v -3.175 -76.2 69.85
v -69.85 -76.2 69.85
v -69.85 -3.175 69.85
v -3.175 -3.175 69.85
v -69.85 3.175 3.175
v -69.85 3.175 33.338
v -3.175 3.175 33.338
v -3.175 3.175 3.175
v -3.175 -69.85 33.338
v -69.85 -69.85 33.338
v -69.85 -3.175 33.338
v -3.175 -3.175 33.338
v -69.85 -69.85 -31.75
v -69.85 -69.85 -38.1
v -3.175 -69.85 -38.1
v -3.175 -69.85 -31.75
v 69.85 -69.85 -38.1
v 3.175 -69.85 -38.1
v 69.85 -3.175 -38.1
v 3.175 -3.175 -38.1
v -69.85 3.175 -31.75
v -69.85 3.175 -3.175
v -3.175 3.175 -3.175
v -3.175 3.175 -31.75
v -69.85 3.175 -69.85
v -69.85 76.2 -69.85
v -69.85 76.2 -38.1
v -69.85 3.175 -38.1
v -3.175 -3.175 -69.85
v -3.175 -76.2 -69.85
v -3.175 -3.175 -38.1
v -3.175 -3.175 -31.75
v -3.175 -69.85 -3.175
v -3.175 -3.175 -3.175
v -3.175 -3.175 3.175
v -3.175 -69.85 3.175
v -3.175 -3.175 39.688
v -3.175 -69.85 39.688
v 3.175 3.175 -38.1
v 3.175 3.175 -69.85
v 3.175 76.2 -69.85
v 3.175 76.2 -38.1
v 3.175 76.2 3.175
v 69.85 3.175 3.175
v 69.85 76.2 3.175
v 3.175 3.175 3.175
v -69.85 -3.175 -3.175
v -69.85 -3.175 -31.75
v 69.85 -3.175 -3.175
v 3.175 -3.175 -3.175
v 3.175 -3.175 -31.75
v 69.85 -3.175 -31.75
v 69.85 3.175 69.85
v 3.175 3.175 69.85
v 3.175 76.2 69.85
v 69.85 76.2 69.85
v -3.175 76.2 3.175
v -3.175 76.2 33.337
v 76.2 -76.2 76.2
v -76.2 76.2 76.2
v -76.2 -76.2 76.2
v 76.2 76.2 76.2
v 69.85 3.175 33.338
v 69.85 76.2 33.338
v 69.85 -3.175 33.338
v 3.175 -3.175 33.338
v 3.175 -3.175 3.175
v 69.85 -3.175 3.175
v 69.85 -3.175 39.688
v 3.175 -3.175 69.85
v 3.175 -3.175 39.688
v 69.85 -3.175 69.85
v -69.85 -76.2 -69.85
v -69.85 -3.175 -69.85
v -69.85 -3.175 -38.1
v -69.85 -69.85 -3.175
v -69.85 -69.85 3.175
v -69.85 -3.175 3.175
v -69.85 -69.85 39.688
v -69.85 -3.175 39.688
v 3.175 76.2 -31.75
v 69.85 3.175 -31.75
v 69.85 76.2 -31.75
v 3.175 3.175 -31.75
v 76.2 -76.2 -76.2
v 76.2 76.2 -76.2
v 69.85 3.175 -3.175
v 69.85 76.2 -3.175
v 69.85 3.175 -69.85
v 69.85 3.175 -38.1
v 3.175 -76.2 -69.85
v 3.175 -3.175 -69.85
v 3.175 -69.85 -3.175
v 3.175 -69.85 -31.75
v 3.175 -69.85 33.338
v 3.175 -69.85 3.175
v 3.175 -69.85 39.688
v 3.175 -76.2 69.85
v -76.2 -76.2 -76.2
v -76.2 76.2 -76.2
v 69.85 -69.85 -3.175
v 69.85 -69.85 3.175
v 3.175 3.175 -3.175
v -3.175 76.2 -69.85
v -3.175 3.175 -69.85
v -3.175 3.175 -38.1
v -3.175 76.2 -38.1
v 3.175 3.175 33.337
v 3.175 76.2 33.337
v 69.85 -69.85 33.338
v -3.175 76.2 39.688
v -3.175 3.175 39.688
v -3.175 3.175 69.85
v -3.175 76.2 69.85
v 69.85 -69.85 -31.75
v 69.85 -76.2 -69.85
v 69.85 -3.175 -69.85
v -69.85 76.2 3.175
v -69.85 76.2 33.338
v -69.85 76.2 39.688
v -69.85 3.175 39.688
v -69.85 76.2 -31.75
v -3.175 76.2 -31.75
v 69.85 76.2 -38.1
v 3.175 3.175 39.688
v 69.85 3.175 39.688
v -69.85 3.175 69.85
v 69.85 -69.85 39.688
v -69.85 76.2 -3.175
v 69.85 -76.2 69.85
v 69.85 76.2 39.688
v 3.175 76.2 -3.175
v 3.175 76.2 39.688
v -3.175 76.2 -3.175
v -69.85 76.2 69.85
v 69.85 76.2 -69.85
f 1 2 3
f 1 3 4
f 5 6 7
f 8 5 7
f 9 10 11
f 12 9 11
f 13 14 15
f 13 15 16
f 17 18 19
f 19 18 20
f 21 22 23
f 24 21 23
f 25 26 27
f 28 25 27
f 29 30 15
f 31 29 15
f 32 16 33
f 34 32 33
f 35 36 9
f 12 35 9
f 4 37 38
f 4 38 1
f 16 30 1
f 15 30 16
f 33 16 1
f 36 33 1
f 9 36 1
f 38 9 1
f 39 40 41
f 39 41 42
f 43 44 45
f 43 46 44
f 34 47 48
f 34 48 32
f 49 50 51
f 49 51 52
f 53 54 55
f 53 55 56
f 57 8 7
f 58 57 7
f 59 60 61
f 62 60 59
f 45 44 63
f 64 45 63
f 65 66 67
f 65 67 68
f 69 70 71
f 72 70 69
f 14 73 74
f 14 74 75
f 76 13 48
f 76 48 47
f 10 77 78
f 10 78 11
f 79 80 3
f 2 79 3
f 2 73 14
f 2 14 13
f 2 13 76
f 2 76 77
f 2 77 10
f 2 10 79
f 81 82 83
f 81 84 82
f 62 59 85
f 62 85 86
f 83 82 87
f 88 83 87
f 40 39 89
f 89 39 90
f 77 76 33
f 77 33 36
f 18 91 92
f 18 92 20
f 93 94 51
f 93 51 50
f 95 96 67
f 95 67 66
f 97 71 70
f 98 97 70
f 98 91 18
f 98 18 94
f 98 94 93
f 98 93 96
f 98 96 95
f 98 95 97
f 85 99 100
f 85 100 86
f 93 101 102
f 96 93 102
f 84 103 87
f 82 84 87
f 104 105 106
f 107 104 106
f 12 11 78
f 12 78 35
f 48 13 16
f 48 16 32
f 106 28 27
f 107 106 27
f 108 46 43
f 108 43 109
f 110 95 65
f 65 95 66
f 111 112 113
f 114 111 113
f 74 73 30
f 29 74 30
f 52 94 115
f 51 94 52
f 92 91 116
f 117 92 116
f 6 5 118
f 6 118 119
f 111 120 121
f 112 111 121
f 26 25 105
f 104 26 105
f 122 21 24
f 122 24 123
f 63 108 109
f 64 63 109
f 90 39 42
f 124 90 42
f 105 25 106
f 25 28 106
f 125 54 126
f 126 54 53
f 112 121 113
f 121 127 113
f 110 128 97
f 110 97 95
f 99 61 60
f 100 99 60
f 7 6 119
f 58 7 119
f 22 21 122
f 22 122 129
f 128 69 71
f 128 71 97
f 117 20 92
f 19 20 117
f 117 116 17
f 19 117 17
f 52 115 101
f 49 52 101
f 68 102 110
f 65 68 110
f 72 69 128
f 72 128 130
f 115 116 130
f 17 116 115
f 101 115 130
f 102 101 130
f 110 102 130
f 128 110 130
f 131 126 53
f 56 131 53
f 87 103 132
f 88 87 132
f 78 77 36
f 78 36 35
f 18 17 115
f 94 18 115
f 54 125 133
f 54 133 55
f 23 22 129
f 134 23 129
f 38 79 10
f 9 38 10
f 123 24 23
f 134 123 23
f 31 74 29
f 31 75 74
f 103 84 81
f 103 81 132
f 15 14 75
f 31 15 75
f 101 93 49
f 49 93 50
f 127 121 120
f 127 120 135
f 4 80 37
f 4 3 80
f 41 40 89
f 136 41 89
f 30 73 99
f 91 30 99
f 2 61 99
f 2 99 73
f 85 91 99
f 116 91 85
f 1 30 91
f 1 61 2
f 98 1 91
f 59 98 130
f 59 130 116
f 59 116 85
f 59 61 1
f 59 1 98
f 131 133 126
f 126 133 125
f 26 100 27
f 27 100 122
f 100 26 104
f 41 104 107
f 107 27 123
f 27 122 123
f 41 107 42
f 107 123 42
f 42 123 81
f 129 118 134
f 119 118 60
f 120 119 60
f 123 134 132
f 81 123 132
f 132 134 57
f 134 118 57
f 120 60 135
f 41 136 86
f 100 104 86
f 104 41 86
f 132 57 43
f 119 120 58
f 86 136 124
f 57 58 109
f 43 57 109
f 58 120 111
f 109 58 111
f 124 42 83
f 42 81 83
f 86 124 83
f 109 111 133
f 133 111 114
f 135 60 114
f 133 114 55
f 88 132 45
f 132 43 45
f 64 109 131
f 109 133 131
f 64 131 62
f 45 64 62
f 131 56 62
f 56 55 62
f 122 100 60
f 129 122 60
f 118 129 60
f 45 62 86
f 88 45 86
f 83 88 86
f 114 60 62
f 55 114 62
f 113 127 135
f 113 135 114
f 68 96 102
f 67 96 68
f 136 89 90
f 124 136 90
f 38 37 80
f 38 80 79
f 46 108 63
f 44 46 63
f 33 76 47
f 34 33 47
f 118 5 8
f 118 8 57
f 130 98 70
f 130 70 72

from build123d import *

# Parameters (mm, degrees)
F0_W     = 152.4
F0_H     = 152.4
F1_DEPTH = 76.2
F2_T     = -6.35
F3_W     = 6.35
F3_H     = 139.7
F4_DEPTH = 152.4
F5_W     = 139.7
F5_H     = 6.35
F6_DEPTH = 139.7
F7_DEPTH = 63.5
F8_W     = 152.4
F8_H     = 6.35
F9_DEPTH = 152.4


with BuildPart() as f1:
    # F0 (on Front) → F1 (new body, symmetric)
    with BuildSketch(Plane.XZ):
        Rectangle(F0_W, F0_H)
    extrude(amount=F1_DEPTH, both=True)

    # F2
    f2_openings = [f1.faces().sort_by_distance(p)[0] for p in [
        (0, -76.2, 0),
    ]]
    offset(amount=F2_T, openings=f2_openings)

    # F3 (on face) → F4 (join)
    with BuildSketch(Plane.XZ.offset(76.2)):
        Rectangle(F3_W, F3_H)
    extrude(amount=-F4_DEPTH)

    # F5 (on face) → F6 (join)
    with BuildSketch(Plane.YZ.offset(-69.85)):
        Rectangle(F5_W, F5_H)
        Polygon((-69.85, 33.3375), (69.85, 33.3375), (69.85, 36.5125), (69.85, 39.6875), (-69.85, 39.6875), (-69.85, 36.5125), align=None)
        with Locations((0, -34.925)):
            Rectangle(F5_W, F5_H)
    extrude(amount=F6_DEPTH)

    # F7 (cut, symmetric): faces of the model
    f7_faces = [f1.faces().sort_by_distance(p)[0] for p in [
        (-36.5125, 69.85, -53.975),
        (-36.5125, 69.85, -17.4625),
        (-36.5125, 69.85, 18.25625),
        (-36.5125, 69.85, 54.76875),
        (36.5125, 69.85, 54.76875),
        (36.5125, 69.85, 18.25625),
        (36.5125, 69.85, -17.4625),
        (36.5125, 69.85, -53.975),
    ]]
    extrude(f7_faces, amount=F7_DEPTH, both=True, mode=Mode.SUBTRACT)

    # F8 (on face) → F9 (join)
    with BuildSketch(Plane.XY.offset(76.2)):
        Rectangle(F8_W, F8_H)
    extrude(amount=-F9_DEPTH)


solid = f1.part
